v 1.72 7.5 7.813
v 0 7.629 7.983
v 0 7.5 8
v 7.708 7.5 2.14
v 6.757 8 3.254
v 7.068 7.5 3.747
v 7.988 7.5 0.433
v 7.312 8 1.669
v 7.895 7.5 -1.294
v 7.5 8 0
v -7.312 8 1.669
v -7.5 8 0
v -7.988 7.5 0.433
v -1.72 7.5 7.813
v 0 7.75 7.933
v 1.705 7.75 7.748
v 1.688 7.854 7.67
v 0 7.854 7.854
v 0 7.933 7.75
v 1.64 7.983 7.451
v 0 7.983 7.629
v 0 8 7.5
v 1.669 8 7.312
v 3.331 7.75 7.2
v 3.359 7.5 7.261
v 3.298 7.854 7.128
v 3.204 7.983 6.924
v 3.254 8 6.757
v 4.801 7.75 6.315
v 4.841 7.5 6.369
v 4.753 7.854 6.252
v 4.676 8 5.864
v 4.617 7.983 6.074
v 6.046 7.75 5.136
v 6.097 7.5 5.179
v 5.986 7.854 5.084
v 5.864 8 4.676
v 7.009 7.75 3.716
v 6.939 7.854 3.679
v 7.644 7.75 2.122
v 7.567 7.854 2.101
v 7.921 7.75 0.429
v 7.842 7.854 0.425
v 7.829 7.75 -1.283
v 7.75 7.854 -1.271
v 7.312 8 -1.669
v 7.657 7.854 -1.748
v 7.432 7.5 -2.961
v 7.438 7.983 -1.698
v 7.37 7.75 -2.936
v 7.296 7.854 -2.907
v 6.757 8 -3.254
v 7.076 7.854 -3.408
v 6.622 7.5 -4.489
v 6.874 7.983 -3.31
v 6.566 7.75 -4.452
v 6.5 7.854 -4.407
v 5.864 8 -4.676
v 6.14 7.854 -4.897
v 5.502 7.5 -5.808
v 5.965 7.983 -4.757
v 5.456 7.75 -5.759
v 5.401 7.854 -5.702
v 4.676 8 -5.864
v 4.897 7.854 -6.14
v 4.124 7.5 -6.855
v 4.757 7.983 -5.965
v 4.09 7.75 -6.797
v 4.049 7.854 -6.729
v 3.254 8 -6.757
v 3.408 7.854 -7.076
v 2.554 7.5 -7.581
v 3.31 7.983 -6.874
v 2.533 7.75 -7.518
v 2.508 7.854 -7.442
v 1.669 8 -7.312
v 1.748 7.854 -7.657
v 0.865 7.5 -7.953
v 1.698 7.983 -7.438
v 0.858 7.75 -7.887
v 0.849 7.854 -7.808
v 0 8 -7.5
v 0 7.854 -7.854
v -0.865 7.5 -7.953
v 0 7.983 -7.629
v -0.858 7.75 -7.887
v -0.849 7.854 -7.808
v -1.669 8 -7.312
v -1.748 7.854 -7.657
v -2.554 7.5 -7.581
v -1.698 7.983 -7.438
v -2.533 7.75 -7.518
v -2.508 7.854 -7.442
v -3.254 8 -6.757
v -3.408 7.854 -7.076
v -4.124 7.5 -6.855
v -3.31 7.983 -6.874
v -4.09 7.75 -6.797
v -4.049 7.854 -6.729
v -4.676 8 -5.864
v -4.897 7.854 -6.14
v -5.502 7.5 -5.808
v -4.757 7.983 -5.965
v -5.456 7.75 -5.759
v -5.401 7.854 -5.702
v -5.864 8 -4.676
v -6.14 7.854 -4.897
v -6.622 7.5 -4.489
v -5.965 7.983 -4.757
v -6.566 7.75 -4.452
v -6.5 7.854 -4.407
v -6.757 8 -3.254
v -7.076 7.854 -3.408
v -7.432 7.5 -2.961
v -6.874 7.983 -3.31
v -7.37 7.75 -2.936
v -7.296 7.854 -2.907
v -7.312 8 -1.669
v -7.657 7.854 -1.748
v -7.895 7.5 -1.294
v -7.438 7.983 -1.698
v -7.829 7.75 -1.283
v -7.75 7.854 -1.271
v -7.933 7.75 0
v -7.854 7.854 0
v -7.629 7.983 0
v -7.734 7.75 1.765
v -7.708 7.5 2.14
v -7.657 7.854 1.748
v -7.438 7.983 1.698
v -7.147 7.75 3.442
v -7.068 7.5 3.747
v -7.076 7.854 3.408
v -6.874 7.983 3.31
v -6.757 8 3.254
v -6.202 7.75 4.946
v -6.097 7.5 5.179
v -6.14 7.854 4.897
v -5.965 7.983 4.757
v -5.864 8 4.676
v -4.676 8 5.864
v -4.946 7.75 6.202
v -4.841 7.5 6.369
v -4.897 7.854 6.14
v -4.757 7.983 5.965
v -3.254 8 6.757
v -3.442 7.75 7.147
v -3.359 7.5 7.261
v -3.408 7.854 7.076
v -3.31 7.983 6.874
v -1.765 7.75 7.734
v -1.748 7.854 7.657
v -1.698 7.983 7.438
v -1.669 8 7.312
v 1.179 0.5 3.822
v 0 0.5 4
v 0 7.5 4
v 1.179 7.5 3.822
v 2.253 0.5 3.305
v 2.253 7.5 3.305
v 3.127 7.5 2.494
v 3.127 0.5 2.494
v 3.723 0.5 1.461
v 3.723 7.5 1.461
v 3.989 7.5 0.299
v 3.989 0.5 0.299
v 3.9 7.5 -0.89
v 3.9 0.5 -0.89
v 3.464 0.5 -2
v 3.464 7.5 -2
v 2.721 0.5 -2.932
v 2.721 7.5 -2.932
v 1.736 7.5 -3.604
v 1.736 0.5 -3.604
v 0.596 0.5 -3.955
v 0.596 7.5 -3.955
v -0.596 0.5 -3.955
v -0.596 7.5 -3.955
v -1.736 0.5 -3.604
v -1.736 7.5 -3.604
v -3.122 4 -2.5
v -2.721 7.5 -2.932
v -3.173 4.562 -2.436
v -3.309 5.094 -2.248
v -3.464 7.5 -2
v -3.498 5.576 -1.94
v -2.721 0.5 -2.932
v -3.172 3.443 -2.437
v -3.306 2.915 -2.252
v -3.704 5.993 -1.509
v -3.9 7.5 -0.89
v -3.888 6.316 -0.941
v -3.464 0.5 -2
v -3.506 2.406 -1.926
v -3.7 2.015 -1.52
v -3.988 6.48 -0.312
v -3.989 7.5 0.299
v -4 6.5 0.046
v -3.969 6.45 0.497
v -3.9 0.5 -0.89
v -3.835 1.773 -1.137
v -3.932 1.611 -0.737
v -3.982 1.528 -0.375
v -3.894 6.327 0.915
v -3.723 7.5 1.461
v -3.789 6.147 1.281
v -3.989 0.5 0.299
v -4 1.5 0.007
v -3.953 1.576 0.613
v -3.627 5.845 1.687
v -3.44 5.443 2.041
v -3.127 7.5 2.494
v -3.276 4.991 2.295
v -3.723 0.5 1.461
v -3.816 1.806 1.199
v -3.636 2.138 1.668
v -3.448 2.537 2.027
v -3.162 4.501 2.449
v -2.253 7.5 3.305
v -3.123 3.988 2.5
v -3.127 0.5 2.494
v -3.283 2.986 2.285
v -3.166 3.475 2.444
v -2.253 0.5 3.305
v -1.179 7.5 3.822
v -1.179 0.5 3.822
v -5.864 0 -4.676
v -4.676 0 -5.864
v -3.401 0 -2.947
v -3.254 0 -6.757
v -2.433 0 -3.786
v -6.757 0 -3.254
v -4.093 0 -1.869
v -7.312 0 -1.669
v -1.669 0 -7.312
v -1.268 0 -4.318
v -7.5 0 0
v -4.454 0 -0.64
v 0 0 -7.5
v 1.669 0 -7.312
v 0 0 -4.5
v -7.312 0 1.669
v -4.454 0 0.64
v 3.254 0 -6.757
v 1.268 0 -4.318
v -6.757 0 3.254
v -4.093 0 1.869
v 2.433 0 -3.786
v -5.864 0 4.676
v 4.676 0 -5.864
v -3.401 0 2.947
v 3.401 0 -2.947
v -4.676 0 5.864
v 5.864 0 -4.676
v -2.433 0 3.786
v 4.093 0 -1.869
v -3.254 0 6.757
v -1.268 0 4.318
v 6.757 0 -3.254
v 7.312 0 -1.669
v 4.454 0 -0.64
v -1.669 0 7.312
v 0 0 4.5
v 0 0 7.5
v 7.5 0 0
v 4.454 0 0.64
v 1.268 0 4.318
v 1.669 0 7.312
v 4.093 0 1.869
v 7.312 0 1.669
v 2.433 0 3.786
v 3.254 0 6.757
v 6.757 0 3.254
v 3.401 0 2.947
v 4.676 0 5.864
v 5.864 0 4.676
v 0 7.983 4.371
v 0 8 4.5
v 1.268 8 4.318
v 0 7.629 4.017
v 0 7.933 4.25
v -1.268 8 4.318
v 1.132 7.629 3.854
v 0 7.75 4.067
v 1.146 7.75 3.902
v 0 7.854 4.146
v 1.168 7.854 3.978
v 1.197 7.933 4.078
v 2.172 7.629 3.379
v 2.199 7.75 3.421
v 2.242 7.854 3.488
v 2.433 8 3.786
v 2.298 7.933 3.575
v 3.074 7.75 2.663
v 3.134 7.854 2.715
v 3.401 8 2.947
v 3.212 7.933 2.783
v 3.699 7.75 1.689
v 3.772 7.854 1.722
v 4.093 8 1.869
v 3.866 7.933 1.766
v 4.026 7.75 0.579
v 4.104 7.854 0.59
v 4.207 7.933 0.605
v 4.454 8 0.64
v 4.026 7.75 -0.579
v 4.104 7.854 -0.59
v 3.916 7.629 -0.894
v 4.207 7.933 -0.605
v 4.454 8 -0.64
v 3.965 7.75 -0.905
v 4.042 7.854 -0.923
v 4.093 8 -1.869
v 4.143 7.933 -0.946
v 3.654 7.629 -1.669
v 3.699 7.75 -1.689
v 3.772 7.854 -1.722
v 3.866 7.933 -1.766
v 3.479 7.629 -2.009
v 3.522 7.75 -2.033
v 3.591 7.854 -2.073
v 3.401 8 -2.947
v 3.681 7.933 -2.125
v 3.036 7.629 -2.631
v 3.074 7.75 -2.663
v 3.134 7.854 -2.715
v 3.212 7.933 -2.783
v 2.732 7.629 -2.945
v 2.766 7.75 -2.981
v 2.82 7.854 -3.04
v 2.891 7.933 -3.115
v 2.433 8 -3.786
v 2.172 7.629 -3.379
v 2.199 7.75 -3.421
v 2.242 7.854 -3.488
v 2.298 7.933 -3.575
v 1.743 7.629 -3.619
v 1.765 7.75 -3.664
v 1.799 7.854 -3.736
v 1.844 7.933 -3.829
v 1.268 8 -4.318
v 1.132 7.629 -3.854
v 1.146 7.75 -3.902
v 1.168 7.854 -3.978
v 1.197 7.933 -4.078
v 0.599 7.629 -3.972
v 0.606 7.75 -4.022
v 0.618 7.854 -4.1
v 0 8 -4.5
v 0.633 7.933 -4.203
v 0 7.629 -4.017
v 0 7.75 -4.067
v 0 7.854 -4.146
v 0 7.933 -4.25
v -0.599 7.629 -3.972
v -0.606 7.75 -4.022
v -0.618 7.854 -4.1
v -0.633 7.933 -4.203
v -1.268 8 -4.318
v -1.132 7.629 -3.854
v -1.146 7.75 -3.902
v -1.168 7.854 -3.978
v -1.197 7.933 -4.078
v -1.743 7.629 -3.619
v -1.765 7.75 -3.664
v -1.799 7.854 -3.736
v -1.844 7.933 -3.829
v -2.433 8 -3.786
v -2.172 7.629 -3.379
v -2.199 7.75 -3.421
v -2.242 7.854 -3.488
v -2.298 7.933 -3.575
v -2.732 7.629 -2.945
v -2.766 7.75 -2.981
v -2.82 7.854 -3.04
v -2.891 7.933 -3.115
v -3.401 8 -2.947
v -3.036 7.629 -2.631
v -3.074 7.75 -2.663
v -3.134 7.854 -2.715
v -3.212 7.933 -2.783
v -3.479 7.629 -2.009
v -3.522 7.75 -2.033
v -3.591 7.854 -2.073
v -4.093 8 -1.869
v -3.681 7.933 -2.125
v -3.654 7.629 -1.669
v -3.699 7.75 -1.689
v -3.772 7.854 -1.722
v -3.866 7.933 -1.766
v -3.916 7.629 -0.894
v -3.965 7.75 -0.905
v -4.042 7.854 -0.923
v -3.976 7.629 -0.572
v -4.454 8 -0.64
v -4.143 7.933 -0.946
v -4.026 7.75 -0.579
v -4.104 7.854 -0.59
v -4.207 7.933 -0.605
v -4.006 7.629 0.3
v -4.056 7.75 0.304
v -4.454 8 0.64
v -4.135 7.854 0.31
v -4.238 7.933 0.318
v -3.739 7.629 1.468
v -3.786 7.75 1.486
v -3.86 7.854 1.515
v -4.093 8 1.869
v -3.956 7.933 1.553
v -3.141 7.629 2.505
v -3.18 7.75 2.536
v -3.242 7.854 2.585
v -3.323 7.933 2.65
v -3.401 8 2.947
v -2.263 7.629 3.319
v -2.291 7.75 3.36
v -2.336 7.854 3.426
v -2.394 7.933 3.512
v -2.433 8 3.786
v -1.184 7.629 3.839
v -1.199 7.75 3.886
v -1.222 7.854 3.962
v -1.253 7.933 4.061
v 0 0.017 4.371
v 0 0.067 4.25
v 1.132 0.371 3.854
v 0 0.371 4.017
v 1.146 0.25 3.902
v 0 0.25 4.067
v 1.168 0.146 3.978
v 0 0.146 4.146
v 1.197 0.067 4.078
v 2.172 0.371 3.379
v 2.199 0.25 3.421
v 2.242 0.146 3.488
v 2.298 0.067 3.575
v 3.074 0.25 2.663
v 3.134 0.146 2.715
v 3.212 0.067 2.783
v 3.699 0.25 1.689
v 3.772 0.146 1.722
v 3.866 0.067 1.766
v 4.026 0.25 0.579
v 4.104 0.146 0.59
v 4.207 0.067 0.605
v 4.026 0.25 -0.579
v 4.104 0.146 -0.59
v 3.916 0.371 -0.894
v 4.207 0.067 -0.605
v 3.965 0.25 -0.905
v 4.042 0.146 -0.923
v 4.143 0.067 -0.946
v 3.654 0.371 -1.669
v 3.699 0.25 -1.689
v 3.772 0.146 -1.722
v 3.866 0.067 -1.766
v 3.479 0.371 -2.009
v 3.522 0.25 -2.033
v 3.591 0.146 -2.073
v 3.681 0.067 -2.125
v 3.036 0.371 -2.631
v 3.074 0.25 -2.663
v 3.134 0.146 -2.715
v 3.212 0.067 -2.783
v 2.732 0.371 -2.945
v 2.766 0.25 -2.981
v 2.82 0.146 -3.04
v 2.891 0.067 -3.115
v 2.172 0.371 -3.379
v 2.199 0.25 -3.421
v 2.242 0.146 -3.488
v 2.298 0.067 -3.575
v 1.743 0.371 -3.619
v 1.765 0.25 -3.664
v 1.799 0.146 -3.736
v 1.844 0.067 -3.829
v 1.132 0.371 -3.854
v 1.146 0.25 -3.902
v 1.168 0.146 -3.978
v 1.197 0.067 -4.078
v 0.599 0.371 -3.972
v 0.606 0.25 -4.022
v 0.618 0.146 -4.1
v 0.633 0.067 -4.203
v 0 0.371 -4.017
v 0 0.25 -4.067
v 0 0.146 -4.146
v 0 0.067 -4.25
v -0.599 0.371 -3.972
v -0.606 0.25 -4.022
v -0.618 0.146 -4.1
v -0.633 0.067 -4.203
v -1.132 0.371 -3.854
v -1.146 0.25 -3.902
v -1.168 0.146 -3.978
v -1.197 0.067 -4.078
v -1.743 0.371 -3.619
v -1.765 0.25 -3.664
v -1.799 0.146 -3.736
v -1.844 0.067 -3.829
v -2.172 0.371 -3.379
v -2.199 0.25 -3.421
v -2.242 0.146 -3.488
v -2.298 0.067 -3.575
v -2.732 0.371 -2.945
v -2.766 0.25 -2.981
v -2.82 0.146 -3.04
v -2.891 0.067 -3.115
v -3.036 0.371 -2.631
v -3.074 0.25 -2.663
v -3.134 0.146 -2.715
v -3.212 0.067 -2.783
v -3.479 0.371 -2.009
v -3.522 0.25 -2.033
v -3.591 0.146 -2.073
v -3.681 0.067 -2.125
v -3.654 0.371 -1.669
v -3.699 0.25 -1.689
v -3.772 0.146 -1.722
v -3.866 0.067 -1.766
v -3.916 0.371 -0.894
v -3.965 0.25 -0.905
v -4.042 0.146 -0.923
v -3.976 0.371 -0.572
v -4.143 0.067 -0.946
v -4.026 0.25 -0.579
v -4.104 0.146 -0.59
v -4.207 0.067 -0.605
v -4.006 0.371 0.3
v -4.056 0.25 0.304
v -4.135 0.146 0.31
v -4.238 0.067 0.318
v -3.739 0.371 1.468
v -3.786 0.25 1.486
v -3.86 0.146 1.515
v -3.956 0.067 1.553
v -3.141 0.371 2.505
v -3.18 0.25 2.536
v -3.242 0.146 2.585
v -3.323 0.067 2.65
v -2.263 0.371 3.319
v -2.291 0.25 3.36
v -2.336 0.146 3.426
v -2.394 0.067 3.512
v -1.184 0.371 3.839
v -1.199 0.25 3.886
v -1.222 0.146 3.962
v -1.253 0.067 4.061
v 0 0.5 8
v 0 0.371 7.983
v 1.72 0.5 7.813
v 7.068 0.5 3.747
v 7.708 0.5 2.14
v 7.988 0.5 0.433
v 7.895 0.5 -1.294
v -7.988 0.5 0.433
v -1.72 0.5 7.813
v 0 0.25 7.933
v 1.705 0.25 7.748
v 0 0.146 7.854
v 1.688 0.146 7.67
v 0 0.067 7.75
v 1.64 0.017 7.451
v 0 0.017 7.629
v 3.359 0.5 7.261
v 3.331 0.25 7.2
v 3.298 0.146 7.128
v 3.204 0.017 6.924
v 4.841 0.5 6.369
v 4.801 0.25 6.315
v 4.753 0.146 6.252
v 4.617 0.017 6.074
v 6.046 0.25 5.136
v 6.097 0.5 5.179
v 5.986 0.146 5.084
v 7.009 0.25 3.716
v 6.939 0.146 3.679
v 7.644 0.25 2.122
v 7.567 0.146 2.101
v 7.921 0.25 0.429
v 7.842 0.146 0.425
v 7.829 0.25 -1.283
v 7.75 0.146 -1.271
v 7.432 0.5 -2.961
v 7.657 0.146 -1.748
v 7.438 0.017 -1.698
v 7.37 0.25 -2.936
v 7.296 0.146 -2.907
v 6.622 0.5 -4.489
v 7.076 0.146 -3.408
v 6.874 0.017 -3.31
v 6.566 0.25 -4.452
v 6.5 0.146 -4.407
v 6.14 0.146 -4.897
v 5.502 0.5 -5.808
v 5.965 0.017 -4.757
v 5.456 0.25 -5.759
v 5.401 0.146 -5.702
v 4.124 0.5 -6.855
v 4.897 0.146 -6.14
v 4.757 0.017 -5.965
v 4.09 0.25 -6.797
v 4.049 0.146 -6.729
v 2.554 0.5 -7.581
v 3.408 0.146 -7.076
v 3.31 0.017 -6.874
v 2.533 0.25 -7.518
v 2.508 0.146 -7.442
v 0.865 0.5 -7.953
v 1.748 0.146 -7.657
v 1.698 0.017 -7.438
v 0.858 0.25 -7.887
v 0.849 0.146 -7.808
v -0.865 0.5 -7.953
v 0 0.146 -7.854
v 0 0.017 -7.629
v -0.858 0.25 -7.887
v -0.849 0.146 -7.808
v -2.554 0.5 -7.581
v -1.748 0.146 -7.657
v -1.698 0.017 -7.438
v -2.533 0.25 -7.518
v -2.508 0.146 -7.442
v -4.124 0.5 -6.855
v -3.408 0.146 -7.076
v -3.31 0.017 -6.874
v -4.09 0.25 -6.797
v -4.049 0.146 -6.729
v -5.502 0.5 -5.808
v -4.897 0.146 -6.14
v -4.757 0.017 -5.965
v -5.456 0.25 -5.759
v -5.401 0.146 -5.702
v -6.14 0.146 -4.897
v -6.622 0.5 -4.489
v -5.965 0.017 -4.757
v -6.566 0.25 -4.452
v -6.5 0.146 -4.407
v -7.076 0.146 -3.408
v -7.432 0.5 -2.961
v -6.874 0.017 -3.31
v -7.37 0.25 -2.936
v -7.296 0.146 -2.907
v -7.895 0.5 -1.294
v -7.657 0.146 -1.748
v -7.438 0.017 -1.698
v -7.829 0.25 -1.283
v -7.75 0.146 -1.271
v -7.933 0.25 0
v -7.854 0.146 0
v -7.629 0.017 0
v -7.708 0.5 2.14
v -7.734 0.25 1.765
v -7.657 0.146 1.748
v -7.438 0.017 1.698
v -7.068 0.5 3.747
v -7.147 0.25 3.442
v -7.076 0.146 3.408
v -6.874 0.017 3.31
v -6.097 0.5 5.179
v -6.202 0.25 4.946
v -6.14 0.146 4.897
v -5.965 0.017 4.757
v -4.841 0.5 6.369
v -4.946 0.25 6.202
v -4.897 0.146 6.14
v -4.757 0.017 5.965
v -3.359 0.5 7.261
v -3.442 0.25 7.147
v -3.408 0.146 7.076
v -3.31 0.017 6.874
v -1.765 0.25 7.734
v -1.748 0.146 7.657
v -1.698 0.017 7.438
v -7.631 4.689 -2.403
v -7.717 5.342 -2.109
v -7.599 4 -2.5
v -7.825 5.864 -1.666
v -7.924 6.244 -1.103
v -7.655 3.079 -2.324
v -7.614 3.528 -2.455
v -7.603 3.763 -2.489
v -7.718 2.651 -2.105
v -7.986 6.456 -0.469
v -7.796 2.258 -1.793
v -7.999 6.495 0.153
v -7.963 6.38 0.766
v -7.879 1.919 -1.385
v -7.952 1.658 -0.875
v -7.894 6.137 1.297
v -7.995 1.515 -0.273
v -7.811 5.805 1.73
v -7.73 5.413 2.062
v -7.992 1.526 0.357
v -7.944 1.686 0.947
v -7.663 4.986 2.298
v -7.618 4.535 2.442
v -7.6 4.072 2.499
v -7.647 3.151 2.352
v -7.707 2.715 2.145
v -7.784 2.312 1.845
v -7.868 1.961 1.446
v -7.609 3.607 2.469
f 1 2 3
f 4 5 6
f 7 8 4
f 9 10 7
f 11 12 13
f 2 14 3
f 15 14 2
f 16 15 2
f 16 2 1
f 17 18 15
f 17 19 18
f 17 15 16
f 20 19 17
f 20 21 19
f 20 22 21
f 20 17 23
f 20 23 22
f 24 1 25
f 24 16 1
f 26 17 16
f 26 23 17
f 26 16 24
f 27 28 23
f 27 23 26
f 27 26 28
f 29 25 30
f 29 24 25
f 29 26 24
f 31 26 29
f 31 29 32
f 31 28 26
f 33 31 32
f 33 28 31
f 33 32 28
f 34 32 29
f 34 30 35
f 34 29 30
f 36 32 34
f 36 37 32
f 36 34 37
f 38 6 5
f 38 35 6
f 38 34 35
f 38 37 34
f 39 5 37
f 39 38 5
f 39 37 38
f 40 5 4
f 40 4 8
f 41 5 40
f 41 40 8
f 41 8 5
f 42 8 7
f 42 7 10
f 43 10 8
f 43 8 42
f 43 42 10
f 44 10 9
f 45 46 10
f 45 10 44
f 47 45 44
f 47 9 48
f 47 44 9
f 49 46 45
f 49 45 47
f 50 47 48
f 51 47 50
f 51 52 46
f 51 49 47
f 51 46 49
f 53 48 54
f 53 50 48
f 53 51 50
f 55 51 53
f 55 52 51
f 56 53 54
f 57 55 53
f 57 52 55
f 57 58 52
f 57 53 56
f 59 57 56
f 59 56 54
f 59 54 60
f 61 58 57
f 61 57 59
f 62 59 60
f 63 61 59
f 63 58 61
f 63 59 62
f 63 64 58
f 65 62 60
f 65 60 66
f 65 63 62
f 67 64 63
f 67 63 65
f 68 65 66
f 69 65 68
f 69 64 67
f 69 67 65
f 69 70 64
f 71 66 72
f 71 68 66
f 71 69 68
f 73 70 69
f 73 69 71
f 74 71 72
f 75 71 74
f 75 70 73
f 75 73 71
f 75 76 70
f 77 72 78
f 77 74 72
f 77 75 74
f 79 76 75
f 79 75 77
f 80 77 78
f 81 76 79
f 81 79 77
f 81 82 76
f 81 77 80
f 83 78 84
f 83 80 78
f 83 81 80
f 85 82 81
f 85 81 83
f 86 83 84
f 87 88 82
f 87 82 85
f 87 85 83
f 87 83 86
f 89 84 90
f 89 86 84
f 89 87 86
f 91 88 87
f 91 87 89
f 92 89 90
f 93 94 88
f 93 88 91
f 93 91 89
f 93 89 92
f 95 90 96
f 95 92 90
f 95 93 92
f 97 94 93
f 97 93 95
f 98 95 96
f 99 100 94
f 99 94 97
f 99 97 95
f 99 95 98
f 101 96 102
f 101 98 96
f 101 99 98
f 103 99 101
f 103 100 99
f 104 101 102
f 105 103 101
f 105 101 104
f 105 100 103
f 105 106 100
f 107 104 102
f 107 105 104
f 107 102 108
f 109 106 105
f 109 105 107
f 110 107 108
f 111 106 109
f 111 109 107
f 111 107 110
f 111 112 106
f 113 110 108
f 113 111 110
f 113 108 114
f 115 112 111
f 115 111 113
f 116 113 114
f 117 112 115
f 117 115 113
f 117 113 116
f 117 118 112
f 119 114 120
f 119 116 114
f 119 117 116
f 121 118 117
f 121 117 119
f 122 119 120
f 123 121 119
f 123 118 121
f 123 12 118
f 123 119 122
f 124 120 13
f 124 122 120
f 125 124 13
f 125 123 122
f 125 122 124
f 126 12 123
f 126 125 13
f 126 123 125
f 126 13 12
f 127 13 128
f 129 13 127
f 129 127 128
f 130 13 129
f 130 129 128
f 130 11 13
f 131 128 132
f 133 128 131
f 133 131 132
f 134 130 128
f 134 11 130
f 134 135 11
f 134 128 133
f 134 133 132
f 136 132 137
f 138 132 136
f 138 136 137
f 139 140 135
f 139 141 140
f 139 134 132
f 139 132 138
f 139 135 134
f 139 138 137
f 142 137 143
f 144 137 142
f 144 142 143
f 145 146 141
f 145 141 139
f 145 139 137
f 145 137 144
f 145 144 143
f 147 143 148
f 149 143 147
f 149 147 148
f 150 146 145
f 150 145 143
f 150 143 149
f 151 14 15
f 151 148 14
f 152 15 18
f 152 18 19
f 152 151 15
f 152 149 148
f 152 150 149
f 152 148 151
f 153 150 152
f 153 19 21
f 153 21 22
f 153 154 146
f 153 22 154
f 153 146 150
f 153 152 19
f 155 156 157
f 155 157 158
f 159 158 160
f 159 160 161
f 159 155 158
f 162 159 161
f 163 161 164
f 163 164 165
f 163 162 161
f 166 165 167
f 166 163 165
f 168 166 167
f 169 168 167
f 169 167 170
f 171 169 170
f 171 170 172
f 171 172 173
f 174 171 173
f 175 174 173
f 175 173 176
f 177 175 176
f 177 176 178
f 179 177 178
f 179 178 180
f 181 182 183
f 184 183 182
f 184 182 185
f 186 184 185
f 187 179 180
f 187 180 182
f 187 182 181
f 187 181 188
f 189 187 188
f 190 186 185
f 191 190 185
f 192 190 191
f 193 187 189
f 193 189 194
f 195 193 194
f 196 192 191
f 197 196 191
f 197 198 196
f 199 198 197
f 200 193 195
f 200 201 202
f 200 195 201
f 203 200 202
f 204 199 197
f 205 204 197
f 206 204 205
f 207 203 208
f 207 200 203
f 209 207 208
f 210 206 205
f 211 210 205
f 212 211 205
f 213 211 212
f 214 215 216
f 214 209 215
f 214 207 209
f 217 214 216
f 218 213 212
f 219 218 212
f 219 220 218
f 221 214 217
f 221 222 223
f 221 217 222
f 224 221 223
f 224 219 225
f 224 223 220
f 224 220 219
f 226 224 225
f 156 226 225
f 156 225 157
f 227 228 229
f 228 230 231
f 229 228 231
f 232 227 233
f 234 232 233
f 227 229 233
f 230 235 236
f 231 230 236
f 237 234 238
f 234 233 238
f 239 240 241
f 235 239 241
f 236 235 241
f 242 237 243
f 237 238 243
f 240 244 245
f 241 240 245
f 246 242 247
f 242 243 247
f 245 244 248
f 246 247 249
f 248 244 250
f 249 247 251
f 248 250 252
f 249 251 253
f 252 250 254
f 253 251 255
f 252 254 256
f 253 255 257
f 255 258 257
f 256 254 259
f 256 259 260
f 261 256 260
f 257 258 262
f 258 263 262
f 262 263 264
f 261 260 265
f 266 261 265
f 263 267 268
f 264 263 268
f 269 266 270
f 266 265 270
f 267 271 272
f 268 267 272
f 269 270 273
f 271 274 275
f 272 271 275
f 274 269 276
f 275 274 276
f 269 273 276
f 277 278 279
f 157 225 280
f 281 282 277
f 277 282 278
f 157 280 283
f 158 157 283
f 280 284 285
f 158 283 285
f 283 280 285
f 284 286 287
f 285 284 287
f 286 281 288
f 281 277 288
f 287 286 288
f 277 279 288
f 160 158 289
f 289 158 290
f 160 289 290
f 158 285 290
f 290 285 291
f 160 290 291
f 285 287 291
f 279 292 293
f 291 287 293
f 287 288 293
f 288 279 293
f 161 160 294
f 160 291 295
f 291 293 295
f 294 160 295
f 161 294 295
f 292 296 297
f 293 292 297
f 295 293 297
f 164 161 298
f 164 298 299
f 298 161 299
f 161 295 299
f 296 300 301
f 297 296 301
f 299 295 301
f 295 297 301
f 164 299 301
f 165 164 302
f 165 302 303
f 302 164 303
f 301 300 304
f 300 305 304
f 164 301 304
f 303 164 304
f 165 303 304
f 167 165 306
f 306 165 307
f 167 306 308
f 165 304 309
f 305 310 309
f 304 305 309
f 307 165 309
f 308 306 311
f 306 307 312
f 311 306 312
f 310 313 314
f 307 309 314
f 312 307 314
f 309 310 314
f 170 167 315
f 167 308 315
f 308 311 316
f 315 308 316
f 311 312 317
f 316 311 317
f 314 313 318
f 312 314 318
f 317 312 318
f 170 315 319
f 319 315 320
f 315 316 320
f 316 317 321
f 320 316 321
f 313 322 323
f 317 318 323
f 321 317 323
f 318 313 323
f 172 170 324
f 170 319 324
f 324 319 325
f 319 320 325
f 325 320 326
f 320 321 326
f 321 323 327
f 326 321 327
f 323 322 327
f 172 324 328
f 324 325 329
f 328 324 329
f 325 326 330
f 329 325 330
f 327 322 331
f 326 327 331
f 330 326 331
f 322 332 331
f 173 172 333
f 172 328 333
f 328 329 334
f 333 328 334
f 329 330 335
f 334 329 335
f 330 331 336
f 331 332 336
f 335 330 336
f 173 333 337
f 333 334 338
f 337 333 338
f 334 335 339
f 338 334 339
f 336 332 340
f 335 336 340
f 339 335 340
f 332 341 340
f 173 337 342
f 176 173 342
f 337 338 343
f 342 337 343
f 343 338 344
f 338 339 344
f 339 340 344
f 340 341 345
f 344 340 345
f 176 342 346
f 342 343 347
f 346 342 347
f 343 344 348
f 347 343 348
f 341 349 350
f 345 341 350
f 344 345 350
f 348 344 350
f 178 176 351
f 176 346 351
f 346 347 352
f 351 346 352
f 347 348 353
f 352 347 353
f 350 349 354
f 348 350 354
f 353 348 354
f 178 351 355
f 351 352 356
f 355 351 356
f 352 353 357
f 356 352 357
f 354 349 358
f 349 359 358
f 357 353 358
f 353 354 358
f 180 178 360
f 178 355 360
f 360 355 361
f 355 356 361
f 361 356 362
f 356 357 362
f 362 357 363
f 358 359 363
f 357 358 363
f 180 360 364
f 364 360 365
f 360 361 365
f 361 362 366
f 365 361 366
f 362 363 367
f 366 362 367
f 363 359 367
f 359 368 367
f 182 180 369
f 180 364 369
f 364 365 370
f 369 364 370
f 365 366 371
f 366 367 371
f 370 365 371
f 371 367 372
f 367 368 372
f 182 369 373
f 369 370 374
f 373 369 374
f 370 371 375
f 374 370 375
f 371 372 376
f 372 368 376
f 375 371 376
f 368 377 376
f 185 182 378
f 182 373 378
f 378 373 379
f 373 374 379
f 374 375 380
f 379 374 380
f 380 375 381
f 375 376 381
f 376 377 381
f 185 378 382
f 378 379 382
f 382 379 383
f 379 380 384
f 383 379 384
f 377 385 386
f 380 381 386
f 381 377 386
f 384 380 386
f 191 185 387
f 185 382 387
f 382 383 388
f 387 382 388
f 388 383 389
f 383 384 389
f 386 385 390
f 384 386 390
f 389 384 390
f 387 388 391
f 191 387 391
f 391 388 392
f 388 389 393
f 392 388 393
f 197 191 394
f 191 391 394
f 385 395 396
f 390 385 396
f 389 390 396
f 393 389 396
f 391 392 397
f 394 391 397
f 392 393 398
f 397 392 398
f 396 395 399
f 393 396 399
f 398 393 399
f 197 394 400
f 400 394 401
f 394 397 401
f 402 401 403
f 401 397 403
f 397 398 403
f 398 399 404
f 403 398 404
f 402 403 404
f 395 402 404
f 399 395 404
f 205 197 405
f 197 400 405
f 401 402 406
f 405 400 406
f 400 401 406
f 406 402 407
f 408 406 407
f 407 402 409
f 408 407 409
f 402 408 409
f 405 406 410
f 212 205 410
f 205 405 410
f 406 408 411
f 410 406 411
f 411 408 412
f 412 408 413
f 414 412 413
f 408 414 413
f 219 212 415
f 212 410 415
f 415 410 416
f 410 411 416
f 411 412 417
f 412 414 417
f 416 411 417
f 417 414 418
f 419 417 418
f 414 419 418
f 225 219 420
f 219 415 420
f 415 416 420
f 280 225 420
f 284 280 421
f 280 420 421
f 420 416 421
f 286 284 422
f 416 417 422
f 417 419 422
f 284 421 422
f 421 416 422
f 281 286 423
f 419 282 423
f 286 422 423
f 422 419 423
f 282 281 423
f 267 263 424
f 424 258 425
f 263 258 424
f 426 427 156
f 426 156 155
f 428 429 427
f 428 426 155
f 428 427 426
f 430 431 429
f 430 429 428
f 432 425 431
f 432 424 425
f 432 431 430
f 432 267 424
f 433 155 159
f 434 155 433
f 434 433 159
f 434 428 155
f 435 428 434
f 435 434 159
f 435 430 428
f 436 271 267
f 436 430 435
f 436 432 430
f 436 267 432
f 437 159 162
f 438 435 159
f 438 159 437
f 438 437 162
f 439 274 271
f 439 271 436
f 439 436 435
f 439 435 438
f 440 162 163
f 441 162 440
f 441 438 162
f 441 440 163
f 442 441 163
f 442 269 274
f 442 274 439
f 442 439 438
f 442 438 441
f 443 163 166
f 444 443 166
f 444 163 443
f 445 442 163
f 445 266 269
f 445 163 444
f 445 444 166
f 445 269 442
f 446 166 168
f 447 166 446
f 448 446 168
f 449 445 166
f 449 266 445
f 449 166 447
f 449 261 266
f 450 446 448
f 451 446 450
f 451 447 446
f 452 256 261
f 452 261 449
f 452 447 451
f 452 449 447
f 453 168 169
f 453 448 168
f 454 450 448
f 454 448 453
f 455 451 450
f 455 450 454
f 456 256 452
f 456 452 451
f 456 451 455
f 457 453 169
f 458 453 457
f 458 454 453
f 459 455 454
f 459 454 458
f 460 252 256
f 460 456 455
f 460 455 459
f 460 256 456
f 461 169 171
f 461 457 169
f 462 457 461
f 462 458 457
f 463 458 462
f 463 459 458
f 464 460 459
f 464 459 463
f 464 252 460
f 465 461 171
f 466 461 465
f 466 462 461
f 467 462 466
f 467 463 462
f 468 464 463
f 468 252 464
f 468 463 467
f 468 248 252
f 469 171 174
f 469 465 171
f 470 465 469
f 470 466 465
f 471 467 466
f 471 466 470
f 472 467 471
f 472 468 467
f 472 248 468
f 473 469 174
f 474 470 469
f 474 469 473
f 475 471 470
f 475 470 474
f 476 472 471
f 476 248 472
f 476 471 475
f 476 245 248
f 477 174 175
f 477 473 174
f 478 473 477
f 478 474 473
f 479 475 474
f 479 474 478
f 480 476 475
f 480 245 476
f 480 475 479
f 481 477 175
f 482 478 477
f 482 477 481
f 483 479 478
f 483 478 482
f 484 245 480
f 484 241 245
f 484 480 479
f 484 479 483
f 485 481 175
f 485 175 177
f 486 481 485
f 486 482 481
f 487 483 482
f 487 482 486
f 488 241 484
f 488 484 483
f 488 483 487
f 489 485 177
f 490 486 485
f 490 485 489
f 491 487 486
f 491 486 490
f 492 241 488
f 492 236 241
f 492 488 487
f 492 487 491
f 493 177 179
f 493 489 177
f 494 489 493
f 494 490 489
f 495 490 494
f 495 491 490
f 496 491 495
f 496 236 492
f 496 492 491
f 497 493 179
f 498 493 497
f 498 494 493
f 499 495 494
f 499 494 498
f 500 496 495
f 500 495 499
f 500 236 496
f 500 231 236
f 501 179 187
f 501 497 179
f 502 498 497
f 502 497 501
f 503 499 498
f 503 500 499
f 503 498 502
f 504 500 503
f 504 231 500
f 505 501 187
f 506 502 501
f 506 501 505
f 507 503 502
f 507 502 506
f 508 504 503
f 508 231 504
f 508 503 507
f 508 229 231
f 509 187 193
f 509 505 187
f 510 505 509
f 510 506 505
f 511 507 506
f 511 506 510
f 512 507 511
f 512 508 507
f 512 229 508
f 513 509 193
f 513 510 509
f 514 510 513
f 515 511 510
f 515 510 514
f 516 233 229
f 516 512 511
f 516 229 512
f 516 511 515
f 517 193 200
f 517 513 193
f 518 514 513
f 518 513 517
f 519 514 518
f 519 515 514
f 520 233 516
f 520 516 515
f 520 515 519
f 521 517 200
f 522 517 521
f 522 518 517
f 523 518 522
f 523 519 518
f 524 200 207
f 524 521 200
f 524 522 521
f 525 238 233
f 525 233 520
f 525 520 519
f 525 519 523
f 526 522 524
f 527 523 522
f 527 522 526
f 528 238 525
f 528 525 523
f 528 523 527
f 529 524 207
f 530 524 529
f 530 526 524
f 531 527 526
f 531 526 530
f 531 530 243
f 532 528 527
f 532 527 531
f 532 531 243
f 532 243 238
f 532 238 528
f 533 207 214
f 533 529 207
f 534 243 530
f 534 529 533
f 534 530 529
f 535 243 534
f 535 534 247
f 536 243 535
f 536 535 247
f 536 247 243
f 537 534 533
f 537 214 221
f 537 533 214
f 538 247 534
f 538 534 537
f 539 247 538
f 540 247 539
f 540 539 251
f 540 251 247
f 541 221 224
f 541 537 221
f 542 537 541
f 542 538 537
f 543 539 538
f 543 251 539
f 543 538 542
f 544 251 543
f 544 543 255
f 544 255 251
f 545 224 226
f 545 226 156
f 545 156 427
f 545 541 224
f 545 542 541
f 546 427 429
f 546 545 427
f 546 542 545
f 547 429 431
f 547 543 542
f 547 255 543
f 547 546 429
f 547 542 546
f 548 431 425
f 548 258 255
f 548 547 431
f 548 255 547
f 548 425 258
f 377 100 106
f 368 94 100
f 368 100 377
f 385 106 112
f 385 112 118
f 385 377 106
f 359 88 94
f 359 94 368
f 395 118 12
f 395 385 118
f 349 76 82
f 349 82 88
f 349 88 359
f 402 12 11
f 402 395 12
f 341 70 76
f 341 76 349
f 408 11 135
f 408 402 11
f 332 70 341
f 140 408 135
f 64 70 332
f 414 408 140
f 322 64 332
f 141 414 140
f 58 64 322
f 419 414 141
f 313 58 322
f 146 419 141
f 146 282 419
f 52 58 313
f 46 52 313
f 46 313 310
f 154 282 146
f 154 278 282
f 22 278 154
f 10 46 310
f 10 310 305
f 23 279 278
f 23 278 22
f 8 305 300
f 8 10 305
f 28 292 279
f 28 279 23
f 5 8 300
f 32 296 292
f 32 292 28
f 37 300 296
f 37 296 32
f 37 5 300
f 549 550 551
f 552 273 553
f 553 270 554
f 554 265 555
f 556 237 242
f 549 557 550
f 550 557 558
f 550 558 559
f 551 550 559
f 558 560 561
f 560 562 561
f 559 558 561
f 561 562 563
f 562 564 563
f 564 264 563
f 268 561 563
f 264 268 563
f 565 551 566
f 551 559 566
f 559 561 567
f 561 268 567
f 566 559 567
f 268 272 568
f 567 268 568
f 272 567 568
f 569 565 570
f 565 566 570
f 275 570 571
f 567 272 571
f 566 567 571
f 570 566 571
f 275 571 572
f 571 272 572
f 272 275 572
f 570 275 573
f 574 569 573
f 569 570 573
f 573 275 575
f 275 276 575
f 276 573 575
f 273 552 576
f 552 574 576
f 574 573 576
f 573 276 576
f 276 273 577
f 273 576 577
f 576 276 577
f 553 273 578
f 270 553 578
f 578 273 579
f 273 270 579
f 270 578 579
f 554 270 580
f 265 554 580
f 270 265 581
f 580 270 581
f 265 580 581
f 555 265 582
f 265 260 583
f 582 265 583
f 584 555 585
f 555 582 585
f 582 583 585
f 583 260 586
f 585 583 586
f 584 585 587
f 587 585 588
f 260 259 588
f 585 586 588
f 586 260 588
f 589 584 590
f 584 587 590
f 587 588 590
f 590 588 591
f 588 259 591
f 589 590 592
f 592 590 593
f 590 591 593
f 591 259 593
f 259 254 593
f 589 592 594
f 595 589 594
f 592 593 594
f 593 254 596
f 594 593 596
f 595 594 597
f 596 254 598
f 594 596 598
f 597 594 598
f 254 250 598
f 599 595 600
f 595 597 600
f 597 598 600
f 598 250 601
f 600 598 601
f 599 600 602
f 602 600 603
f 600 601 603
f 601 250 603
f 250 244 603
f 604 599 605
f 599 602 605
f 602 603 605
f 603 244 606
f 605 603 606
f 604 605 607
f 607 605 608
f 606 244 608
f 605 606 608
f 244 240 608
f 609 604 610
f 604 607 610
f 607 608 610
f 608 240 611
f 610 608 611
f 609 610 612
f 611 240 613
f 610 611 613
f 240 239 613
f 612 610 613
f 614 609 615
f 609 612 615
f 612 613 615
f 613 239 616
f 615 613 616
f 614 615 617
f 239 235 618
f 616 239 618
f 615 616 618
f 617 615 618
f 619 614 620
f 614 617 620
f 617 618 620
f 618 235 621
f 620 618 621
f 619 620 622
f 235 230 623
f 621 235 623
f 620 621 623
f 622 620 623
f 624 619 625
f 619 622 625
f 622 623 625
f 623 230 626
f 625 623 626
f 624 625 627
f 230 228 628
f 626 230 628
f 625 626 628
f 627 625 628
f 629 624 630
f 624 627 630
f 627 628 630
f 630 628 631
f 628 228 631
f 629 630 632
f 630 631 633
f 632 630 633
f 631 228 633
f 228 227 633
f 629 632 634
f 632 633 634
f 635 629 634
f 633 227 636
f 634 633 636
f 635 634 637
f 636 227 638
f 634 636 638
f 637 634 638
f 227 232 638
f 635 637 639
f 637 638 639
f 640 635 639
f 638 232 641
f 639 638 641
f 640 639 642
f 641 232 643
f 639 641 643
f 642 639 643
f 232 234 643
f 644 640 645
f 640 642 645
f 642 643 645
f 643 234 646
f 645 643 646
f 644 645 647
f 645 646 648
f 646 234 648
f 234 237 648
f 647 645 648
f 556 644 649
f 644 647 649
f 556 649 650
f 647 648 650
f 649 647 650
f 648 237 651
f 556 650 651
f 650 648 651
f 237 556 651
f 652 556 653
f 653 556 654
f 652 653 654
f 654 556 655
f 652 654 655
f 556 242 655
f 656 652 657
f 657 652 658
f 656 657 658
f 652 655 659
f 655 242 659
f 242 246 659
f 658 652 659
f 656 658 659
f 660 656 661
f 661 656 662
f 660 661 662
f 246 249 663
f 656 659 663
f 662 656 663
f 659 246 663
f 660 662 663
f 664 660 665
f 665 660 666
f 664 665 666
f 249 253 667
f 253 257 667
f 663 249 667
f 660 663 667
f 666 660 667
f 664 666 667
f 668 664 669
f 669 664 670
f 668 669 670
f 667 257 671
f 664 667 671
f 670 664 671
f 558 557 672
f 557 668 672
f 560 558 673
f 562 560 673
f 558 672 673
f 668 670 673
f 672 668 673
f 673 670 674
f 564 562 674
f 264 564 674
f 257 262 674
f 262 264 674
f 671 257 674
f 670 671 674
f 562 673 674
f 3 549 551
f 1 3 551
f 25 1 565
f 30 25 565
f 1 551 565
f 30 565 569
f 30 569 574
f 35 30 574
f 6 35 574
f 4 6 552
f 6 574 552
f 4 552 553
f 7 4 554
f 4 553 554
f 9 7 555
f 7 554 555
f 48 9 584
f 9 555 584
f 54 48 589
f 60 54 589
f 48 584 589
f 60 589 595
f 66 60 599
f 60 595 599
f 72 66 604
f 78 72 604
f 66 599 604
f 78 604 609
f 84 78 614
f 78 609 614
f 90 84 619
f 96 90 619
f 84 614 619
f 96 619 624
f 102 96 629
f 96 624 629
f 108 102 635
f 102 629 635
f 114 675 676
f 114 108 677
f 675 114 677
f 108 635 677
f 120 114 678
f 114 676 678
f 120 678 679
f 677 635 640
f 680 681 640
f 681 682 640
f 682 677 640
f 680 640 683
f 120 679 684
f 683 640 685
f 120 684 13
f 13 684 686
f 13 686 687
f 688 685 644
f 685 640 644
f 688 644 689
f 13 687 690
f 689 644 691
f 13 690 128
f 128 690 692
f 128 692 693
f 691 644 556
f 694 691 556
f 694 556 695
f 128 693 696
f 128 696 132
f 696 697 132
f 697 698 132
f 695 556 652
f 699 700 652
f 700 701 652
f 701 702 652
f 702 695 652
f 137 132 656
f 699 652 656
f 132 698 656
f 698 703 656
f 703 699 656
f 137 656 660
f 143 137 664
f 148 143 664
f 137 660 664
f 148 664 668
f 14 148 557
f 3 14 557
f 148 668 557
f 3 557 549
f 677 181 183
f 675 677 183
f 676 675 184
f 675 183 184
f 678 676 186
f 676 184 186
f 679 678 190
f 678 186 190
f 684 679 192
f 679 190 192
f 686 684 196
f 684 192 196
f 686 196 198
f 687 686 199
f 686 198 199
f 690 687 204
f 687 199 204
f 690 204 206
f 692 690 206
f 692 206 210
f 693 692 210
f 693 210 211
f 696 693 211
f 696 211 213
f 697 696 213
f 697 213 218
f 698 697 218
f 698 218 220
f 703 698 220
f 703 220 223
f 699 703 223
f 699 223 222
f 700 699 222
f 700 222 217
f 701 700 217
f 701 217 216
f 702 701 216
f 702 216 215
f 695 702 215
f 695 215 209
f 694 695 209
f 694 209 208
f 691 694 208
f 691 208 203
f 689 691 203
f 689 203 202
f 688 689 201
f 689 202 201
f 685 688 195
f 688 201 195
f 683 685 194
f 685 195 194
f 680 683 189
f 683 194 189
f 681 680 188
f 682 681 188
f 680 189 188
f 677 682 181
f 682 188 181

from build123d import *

# Parameters (mm, degrees)
SKETCH1_R           = 8
SKETCH1_R_2         = 4
BOSS_EXTRUDE1_DEPTH = 8
SKETCH4_R           = 2.5
CUT_EXTRUDE1_DEPTH  = 8
FILLET1_R           = 0.5


with BuildPart() as part:
    # Sketch1 → Boss-Extrude1 (new body)
    with BuildSketch(Plane(origin=(0, 0, 0), x_dir=(1, 0, 0), z_dir=(0, 1, 0))):
        with Locations(Location((0, 0, 0), (0, 0, 270))):
            Circle(SKETCH1_R)
        with Locations(Location((0, 0, 0), (0, 0, 270))):
            Circle(SKETCH1_R_2, mode=Mode.SUBTRACT)
    extrude(amount=BOSS_EXTRUDE1_DEPTH)

    # Sketch4 → Cut-Extrude1 (cut)
    with BuildSketch(Plane(origin=(0, 0, 0), x_dir=(0, 0, -1), z_dir=(1, 0, 0))):
        with Locations((0, 4)):
            Circle(SKETCH4_R)
    extrude(amount=-CUT_EXTRUDE1_DEPTH, mode=Mode.SUBTRACT)

    # Fillet1
    fillet1_edges = [part.edges().sort_by_distance(p)[0] for p in [
        (0, 0, -8),
        (0, 8, -8),
        (0, 0, -4),
        (0, 8, -4),
    ]]
    fillet(fillet1_edges, radius=FILLET1_R)


solid = part.part
